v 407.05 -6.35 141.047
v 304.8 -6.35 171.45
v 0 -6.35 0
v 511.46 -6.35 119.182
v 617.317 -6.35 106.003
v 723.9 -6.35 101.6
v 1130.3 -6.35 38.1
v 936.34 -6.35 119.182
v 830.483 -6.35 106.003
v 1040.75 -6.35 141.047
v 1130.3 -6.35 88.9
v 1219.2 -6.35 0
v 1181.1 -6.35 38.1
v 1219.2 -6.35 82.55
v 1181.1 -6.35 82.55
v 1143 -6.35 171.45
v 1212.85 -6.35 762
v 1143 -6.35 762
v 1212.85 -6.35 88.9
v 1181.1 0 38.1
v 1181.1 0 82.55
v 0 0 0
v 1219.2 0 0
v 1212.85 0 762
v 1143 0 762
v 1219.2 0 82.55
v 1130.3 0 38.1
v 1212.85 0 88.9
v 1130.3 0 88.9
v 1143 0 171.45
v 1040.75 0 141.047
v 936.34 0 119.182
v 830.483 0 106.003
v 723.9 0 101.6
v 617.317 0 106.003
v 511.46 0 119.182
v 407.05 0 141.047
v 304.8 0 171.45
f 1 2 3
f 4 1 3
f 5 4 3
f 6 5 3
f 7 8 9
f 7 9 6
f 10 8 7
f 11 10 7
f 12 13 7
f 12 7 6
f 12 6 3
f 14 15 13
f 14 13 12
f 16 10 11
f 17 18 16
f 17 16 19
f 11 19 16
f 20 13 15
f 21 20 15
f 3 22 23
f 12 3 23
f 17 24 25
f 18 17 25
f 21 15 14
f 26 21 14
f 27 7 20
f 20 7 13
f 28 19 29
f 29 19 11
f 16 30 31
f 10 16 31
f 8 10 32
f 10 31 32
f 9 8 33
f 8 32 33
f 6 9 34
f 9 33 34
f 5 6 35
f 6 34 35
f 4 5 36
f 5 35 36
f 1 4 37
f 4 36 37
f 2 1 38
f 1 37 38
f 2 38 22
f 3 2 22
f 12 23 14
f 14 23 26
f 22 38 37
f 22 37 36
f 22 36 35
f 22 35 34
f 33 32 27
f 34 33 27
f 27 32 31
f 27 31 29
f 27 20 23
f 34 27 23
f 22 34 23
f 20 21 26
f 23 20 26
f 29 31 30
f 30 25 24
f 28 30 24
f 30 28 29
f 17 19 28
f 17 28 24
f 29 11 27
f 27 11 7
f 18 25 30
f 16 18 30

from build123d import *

# Parameters (mm, degrees)
F1_DEPTH = 6.35
F2_W     = 6.35
F2_H     = 673.1
F3_DEPTH = 25.4


with BuildPart() as f1:
    # F0 (on Front) → F1 (new body)
    with BuildSketch(Plane.XZ):
        Polygon((304.8, 171.45), (0, 0), (1219.2, 0), (1219.2, 762), (1143, 762), (1143, 171.45), (1143, 101.6), (723.9, 101.6), (306.02731713, 101.6), (303.9947166863, 99.612464416), (268.4785905511, 135.9338738649), align=None)
        with BuildLine():
            ThreePointArc((723.9, 101.6), (511.4595186293, 119.182111776), (304.8, 171.45))
            Line((304.8, 171.45), (340.3161261351, 135.1285905511))
            Line((340.3161261351, 135.1285905511), (306.02731713, 101.6))
            Line((306.02731713, 101.6), (723.9, 101.6))
        make_face()
        with BuildLine():
            ThreePointArc((1143, 171.45), (936.3404813707, 119.182111776), (723.9, 101.6))
            Line((723.9, 101.6), (1143, 101.6))
            Line((1143, 101.6), (1143, 171.45))
        make_face()
        Polygon((304.8, 101.6), (304.8, 171.45), (268.4785905511, 135.9338738649), (303.9947166863, 99.612464416), (306.02731713, 101.6), align=None)
        Polygon((340.3161261351, 135.1285905511), (304.8, 171.45), (304.8, 101.6), (306.02731713, 101.6), align=None)
    extrude(amount=F1_DEPTH)

    # F2 (on face) → F3 (cut)
    with BuildSketch(Plane.XZ.offset(6.35)):
        Polygon((1130.3, 88.9), (1130.3, 38.1), (1181.1, 38.1), (1181.1, 82.55), (1181.1, 88.9), align=None)
        with Locations((1216.025, 425.45)):
            Rectangle(F2_W, F2_H)
        Polygon((1181.1, 88.9), (1181.1, 82.55), (1219.2, 82.55), (1219.2, 88.9), (1212.85, 88.9), align=None)
    extrude(amount=-F3_DEPTH, mode=Mode.SUBTRACT)


solid = f1.part
